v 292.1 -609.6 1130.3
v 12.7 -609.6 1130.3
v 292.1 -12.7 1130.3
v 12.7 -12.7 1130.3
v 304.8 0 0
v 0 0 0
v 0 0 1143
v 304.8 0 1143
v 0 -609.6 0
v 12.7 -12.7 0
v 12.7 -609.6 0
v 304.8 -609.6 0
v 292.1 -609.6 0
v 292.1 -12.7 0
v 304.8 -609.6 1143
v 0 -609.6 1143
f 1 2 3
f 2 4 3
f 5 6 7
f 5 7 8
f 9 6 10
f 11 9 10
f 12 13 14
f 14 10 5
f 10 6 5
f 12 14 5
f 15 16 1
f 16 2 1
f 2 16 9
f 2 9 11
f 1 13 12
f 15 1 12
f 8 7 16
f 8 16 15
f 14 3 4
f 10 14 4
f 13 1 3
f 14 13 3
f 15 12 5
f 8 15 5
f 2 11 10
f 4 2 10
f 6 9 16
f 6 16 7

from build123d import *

# Parameters (mm, degrees)
F0_W     = 304.8
F0_H     = 609.6
F1_DEPTH = 1143
F2_T     = -12.7
F3_DEPTH = 12.701


with BuildPart() as f1:
    # F0 (on Top) → F1 (new body)
    with BuildSketch(Plane.XY):
        with Locations((152.4, -304.8)):
            Rectangle(F0_W, F0_H)
    extrude(amount=F1_DEPTH)

    # F2
    f2_openings = [f1.faces().sort_by_distance(p)[0] for p in [
        (152.4, -609.6, 571.5),
    ]]
    offset(amount=F2_T, openings=f2_openings)

    # F3 (cut, through all): a face of the model
    f3_faces = [f1.faces().sort_by_distance(p)[0] for p in [
        (152.4, -311.15, 12.7),
    ]]
    extrude(f3_faces, amount=-F3_DEPTH, mode=Mode.SUBTRACT)


solid = f1.part
